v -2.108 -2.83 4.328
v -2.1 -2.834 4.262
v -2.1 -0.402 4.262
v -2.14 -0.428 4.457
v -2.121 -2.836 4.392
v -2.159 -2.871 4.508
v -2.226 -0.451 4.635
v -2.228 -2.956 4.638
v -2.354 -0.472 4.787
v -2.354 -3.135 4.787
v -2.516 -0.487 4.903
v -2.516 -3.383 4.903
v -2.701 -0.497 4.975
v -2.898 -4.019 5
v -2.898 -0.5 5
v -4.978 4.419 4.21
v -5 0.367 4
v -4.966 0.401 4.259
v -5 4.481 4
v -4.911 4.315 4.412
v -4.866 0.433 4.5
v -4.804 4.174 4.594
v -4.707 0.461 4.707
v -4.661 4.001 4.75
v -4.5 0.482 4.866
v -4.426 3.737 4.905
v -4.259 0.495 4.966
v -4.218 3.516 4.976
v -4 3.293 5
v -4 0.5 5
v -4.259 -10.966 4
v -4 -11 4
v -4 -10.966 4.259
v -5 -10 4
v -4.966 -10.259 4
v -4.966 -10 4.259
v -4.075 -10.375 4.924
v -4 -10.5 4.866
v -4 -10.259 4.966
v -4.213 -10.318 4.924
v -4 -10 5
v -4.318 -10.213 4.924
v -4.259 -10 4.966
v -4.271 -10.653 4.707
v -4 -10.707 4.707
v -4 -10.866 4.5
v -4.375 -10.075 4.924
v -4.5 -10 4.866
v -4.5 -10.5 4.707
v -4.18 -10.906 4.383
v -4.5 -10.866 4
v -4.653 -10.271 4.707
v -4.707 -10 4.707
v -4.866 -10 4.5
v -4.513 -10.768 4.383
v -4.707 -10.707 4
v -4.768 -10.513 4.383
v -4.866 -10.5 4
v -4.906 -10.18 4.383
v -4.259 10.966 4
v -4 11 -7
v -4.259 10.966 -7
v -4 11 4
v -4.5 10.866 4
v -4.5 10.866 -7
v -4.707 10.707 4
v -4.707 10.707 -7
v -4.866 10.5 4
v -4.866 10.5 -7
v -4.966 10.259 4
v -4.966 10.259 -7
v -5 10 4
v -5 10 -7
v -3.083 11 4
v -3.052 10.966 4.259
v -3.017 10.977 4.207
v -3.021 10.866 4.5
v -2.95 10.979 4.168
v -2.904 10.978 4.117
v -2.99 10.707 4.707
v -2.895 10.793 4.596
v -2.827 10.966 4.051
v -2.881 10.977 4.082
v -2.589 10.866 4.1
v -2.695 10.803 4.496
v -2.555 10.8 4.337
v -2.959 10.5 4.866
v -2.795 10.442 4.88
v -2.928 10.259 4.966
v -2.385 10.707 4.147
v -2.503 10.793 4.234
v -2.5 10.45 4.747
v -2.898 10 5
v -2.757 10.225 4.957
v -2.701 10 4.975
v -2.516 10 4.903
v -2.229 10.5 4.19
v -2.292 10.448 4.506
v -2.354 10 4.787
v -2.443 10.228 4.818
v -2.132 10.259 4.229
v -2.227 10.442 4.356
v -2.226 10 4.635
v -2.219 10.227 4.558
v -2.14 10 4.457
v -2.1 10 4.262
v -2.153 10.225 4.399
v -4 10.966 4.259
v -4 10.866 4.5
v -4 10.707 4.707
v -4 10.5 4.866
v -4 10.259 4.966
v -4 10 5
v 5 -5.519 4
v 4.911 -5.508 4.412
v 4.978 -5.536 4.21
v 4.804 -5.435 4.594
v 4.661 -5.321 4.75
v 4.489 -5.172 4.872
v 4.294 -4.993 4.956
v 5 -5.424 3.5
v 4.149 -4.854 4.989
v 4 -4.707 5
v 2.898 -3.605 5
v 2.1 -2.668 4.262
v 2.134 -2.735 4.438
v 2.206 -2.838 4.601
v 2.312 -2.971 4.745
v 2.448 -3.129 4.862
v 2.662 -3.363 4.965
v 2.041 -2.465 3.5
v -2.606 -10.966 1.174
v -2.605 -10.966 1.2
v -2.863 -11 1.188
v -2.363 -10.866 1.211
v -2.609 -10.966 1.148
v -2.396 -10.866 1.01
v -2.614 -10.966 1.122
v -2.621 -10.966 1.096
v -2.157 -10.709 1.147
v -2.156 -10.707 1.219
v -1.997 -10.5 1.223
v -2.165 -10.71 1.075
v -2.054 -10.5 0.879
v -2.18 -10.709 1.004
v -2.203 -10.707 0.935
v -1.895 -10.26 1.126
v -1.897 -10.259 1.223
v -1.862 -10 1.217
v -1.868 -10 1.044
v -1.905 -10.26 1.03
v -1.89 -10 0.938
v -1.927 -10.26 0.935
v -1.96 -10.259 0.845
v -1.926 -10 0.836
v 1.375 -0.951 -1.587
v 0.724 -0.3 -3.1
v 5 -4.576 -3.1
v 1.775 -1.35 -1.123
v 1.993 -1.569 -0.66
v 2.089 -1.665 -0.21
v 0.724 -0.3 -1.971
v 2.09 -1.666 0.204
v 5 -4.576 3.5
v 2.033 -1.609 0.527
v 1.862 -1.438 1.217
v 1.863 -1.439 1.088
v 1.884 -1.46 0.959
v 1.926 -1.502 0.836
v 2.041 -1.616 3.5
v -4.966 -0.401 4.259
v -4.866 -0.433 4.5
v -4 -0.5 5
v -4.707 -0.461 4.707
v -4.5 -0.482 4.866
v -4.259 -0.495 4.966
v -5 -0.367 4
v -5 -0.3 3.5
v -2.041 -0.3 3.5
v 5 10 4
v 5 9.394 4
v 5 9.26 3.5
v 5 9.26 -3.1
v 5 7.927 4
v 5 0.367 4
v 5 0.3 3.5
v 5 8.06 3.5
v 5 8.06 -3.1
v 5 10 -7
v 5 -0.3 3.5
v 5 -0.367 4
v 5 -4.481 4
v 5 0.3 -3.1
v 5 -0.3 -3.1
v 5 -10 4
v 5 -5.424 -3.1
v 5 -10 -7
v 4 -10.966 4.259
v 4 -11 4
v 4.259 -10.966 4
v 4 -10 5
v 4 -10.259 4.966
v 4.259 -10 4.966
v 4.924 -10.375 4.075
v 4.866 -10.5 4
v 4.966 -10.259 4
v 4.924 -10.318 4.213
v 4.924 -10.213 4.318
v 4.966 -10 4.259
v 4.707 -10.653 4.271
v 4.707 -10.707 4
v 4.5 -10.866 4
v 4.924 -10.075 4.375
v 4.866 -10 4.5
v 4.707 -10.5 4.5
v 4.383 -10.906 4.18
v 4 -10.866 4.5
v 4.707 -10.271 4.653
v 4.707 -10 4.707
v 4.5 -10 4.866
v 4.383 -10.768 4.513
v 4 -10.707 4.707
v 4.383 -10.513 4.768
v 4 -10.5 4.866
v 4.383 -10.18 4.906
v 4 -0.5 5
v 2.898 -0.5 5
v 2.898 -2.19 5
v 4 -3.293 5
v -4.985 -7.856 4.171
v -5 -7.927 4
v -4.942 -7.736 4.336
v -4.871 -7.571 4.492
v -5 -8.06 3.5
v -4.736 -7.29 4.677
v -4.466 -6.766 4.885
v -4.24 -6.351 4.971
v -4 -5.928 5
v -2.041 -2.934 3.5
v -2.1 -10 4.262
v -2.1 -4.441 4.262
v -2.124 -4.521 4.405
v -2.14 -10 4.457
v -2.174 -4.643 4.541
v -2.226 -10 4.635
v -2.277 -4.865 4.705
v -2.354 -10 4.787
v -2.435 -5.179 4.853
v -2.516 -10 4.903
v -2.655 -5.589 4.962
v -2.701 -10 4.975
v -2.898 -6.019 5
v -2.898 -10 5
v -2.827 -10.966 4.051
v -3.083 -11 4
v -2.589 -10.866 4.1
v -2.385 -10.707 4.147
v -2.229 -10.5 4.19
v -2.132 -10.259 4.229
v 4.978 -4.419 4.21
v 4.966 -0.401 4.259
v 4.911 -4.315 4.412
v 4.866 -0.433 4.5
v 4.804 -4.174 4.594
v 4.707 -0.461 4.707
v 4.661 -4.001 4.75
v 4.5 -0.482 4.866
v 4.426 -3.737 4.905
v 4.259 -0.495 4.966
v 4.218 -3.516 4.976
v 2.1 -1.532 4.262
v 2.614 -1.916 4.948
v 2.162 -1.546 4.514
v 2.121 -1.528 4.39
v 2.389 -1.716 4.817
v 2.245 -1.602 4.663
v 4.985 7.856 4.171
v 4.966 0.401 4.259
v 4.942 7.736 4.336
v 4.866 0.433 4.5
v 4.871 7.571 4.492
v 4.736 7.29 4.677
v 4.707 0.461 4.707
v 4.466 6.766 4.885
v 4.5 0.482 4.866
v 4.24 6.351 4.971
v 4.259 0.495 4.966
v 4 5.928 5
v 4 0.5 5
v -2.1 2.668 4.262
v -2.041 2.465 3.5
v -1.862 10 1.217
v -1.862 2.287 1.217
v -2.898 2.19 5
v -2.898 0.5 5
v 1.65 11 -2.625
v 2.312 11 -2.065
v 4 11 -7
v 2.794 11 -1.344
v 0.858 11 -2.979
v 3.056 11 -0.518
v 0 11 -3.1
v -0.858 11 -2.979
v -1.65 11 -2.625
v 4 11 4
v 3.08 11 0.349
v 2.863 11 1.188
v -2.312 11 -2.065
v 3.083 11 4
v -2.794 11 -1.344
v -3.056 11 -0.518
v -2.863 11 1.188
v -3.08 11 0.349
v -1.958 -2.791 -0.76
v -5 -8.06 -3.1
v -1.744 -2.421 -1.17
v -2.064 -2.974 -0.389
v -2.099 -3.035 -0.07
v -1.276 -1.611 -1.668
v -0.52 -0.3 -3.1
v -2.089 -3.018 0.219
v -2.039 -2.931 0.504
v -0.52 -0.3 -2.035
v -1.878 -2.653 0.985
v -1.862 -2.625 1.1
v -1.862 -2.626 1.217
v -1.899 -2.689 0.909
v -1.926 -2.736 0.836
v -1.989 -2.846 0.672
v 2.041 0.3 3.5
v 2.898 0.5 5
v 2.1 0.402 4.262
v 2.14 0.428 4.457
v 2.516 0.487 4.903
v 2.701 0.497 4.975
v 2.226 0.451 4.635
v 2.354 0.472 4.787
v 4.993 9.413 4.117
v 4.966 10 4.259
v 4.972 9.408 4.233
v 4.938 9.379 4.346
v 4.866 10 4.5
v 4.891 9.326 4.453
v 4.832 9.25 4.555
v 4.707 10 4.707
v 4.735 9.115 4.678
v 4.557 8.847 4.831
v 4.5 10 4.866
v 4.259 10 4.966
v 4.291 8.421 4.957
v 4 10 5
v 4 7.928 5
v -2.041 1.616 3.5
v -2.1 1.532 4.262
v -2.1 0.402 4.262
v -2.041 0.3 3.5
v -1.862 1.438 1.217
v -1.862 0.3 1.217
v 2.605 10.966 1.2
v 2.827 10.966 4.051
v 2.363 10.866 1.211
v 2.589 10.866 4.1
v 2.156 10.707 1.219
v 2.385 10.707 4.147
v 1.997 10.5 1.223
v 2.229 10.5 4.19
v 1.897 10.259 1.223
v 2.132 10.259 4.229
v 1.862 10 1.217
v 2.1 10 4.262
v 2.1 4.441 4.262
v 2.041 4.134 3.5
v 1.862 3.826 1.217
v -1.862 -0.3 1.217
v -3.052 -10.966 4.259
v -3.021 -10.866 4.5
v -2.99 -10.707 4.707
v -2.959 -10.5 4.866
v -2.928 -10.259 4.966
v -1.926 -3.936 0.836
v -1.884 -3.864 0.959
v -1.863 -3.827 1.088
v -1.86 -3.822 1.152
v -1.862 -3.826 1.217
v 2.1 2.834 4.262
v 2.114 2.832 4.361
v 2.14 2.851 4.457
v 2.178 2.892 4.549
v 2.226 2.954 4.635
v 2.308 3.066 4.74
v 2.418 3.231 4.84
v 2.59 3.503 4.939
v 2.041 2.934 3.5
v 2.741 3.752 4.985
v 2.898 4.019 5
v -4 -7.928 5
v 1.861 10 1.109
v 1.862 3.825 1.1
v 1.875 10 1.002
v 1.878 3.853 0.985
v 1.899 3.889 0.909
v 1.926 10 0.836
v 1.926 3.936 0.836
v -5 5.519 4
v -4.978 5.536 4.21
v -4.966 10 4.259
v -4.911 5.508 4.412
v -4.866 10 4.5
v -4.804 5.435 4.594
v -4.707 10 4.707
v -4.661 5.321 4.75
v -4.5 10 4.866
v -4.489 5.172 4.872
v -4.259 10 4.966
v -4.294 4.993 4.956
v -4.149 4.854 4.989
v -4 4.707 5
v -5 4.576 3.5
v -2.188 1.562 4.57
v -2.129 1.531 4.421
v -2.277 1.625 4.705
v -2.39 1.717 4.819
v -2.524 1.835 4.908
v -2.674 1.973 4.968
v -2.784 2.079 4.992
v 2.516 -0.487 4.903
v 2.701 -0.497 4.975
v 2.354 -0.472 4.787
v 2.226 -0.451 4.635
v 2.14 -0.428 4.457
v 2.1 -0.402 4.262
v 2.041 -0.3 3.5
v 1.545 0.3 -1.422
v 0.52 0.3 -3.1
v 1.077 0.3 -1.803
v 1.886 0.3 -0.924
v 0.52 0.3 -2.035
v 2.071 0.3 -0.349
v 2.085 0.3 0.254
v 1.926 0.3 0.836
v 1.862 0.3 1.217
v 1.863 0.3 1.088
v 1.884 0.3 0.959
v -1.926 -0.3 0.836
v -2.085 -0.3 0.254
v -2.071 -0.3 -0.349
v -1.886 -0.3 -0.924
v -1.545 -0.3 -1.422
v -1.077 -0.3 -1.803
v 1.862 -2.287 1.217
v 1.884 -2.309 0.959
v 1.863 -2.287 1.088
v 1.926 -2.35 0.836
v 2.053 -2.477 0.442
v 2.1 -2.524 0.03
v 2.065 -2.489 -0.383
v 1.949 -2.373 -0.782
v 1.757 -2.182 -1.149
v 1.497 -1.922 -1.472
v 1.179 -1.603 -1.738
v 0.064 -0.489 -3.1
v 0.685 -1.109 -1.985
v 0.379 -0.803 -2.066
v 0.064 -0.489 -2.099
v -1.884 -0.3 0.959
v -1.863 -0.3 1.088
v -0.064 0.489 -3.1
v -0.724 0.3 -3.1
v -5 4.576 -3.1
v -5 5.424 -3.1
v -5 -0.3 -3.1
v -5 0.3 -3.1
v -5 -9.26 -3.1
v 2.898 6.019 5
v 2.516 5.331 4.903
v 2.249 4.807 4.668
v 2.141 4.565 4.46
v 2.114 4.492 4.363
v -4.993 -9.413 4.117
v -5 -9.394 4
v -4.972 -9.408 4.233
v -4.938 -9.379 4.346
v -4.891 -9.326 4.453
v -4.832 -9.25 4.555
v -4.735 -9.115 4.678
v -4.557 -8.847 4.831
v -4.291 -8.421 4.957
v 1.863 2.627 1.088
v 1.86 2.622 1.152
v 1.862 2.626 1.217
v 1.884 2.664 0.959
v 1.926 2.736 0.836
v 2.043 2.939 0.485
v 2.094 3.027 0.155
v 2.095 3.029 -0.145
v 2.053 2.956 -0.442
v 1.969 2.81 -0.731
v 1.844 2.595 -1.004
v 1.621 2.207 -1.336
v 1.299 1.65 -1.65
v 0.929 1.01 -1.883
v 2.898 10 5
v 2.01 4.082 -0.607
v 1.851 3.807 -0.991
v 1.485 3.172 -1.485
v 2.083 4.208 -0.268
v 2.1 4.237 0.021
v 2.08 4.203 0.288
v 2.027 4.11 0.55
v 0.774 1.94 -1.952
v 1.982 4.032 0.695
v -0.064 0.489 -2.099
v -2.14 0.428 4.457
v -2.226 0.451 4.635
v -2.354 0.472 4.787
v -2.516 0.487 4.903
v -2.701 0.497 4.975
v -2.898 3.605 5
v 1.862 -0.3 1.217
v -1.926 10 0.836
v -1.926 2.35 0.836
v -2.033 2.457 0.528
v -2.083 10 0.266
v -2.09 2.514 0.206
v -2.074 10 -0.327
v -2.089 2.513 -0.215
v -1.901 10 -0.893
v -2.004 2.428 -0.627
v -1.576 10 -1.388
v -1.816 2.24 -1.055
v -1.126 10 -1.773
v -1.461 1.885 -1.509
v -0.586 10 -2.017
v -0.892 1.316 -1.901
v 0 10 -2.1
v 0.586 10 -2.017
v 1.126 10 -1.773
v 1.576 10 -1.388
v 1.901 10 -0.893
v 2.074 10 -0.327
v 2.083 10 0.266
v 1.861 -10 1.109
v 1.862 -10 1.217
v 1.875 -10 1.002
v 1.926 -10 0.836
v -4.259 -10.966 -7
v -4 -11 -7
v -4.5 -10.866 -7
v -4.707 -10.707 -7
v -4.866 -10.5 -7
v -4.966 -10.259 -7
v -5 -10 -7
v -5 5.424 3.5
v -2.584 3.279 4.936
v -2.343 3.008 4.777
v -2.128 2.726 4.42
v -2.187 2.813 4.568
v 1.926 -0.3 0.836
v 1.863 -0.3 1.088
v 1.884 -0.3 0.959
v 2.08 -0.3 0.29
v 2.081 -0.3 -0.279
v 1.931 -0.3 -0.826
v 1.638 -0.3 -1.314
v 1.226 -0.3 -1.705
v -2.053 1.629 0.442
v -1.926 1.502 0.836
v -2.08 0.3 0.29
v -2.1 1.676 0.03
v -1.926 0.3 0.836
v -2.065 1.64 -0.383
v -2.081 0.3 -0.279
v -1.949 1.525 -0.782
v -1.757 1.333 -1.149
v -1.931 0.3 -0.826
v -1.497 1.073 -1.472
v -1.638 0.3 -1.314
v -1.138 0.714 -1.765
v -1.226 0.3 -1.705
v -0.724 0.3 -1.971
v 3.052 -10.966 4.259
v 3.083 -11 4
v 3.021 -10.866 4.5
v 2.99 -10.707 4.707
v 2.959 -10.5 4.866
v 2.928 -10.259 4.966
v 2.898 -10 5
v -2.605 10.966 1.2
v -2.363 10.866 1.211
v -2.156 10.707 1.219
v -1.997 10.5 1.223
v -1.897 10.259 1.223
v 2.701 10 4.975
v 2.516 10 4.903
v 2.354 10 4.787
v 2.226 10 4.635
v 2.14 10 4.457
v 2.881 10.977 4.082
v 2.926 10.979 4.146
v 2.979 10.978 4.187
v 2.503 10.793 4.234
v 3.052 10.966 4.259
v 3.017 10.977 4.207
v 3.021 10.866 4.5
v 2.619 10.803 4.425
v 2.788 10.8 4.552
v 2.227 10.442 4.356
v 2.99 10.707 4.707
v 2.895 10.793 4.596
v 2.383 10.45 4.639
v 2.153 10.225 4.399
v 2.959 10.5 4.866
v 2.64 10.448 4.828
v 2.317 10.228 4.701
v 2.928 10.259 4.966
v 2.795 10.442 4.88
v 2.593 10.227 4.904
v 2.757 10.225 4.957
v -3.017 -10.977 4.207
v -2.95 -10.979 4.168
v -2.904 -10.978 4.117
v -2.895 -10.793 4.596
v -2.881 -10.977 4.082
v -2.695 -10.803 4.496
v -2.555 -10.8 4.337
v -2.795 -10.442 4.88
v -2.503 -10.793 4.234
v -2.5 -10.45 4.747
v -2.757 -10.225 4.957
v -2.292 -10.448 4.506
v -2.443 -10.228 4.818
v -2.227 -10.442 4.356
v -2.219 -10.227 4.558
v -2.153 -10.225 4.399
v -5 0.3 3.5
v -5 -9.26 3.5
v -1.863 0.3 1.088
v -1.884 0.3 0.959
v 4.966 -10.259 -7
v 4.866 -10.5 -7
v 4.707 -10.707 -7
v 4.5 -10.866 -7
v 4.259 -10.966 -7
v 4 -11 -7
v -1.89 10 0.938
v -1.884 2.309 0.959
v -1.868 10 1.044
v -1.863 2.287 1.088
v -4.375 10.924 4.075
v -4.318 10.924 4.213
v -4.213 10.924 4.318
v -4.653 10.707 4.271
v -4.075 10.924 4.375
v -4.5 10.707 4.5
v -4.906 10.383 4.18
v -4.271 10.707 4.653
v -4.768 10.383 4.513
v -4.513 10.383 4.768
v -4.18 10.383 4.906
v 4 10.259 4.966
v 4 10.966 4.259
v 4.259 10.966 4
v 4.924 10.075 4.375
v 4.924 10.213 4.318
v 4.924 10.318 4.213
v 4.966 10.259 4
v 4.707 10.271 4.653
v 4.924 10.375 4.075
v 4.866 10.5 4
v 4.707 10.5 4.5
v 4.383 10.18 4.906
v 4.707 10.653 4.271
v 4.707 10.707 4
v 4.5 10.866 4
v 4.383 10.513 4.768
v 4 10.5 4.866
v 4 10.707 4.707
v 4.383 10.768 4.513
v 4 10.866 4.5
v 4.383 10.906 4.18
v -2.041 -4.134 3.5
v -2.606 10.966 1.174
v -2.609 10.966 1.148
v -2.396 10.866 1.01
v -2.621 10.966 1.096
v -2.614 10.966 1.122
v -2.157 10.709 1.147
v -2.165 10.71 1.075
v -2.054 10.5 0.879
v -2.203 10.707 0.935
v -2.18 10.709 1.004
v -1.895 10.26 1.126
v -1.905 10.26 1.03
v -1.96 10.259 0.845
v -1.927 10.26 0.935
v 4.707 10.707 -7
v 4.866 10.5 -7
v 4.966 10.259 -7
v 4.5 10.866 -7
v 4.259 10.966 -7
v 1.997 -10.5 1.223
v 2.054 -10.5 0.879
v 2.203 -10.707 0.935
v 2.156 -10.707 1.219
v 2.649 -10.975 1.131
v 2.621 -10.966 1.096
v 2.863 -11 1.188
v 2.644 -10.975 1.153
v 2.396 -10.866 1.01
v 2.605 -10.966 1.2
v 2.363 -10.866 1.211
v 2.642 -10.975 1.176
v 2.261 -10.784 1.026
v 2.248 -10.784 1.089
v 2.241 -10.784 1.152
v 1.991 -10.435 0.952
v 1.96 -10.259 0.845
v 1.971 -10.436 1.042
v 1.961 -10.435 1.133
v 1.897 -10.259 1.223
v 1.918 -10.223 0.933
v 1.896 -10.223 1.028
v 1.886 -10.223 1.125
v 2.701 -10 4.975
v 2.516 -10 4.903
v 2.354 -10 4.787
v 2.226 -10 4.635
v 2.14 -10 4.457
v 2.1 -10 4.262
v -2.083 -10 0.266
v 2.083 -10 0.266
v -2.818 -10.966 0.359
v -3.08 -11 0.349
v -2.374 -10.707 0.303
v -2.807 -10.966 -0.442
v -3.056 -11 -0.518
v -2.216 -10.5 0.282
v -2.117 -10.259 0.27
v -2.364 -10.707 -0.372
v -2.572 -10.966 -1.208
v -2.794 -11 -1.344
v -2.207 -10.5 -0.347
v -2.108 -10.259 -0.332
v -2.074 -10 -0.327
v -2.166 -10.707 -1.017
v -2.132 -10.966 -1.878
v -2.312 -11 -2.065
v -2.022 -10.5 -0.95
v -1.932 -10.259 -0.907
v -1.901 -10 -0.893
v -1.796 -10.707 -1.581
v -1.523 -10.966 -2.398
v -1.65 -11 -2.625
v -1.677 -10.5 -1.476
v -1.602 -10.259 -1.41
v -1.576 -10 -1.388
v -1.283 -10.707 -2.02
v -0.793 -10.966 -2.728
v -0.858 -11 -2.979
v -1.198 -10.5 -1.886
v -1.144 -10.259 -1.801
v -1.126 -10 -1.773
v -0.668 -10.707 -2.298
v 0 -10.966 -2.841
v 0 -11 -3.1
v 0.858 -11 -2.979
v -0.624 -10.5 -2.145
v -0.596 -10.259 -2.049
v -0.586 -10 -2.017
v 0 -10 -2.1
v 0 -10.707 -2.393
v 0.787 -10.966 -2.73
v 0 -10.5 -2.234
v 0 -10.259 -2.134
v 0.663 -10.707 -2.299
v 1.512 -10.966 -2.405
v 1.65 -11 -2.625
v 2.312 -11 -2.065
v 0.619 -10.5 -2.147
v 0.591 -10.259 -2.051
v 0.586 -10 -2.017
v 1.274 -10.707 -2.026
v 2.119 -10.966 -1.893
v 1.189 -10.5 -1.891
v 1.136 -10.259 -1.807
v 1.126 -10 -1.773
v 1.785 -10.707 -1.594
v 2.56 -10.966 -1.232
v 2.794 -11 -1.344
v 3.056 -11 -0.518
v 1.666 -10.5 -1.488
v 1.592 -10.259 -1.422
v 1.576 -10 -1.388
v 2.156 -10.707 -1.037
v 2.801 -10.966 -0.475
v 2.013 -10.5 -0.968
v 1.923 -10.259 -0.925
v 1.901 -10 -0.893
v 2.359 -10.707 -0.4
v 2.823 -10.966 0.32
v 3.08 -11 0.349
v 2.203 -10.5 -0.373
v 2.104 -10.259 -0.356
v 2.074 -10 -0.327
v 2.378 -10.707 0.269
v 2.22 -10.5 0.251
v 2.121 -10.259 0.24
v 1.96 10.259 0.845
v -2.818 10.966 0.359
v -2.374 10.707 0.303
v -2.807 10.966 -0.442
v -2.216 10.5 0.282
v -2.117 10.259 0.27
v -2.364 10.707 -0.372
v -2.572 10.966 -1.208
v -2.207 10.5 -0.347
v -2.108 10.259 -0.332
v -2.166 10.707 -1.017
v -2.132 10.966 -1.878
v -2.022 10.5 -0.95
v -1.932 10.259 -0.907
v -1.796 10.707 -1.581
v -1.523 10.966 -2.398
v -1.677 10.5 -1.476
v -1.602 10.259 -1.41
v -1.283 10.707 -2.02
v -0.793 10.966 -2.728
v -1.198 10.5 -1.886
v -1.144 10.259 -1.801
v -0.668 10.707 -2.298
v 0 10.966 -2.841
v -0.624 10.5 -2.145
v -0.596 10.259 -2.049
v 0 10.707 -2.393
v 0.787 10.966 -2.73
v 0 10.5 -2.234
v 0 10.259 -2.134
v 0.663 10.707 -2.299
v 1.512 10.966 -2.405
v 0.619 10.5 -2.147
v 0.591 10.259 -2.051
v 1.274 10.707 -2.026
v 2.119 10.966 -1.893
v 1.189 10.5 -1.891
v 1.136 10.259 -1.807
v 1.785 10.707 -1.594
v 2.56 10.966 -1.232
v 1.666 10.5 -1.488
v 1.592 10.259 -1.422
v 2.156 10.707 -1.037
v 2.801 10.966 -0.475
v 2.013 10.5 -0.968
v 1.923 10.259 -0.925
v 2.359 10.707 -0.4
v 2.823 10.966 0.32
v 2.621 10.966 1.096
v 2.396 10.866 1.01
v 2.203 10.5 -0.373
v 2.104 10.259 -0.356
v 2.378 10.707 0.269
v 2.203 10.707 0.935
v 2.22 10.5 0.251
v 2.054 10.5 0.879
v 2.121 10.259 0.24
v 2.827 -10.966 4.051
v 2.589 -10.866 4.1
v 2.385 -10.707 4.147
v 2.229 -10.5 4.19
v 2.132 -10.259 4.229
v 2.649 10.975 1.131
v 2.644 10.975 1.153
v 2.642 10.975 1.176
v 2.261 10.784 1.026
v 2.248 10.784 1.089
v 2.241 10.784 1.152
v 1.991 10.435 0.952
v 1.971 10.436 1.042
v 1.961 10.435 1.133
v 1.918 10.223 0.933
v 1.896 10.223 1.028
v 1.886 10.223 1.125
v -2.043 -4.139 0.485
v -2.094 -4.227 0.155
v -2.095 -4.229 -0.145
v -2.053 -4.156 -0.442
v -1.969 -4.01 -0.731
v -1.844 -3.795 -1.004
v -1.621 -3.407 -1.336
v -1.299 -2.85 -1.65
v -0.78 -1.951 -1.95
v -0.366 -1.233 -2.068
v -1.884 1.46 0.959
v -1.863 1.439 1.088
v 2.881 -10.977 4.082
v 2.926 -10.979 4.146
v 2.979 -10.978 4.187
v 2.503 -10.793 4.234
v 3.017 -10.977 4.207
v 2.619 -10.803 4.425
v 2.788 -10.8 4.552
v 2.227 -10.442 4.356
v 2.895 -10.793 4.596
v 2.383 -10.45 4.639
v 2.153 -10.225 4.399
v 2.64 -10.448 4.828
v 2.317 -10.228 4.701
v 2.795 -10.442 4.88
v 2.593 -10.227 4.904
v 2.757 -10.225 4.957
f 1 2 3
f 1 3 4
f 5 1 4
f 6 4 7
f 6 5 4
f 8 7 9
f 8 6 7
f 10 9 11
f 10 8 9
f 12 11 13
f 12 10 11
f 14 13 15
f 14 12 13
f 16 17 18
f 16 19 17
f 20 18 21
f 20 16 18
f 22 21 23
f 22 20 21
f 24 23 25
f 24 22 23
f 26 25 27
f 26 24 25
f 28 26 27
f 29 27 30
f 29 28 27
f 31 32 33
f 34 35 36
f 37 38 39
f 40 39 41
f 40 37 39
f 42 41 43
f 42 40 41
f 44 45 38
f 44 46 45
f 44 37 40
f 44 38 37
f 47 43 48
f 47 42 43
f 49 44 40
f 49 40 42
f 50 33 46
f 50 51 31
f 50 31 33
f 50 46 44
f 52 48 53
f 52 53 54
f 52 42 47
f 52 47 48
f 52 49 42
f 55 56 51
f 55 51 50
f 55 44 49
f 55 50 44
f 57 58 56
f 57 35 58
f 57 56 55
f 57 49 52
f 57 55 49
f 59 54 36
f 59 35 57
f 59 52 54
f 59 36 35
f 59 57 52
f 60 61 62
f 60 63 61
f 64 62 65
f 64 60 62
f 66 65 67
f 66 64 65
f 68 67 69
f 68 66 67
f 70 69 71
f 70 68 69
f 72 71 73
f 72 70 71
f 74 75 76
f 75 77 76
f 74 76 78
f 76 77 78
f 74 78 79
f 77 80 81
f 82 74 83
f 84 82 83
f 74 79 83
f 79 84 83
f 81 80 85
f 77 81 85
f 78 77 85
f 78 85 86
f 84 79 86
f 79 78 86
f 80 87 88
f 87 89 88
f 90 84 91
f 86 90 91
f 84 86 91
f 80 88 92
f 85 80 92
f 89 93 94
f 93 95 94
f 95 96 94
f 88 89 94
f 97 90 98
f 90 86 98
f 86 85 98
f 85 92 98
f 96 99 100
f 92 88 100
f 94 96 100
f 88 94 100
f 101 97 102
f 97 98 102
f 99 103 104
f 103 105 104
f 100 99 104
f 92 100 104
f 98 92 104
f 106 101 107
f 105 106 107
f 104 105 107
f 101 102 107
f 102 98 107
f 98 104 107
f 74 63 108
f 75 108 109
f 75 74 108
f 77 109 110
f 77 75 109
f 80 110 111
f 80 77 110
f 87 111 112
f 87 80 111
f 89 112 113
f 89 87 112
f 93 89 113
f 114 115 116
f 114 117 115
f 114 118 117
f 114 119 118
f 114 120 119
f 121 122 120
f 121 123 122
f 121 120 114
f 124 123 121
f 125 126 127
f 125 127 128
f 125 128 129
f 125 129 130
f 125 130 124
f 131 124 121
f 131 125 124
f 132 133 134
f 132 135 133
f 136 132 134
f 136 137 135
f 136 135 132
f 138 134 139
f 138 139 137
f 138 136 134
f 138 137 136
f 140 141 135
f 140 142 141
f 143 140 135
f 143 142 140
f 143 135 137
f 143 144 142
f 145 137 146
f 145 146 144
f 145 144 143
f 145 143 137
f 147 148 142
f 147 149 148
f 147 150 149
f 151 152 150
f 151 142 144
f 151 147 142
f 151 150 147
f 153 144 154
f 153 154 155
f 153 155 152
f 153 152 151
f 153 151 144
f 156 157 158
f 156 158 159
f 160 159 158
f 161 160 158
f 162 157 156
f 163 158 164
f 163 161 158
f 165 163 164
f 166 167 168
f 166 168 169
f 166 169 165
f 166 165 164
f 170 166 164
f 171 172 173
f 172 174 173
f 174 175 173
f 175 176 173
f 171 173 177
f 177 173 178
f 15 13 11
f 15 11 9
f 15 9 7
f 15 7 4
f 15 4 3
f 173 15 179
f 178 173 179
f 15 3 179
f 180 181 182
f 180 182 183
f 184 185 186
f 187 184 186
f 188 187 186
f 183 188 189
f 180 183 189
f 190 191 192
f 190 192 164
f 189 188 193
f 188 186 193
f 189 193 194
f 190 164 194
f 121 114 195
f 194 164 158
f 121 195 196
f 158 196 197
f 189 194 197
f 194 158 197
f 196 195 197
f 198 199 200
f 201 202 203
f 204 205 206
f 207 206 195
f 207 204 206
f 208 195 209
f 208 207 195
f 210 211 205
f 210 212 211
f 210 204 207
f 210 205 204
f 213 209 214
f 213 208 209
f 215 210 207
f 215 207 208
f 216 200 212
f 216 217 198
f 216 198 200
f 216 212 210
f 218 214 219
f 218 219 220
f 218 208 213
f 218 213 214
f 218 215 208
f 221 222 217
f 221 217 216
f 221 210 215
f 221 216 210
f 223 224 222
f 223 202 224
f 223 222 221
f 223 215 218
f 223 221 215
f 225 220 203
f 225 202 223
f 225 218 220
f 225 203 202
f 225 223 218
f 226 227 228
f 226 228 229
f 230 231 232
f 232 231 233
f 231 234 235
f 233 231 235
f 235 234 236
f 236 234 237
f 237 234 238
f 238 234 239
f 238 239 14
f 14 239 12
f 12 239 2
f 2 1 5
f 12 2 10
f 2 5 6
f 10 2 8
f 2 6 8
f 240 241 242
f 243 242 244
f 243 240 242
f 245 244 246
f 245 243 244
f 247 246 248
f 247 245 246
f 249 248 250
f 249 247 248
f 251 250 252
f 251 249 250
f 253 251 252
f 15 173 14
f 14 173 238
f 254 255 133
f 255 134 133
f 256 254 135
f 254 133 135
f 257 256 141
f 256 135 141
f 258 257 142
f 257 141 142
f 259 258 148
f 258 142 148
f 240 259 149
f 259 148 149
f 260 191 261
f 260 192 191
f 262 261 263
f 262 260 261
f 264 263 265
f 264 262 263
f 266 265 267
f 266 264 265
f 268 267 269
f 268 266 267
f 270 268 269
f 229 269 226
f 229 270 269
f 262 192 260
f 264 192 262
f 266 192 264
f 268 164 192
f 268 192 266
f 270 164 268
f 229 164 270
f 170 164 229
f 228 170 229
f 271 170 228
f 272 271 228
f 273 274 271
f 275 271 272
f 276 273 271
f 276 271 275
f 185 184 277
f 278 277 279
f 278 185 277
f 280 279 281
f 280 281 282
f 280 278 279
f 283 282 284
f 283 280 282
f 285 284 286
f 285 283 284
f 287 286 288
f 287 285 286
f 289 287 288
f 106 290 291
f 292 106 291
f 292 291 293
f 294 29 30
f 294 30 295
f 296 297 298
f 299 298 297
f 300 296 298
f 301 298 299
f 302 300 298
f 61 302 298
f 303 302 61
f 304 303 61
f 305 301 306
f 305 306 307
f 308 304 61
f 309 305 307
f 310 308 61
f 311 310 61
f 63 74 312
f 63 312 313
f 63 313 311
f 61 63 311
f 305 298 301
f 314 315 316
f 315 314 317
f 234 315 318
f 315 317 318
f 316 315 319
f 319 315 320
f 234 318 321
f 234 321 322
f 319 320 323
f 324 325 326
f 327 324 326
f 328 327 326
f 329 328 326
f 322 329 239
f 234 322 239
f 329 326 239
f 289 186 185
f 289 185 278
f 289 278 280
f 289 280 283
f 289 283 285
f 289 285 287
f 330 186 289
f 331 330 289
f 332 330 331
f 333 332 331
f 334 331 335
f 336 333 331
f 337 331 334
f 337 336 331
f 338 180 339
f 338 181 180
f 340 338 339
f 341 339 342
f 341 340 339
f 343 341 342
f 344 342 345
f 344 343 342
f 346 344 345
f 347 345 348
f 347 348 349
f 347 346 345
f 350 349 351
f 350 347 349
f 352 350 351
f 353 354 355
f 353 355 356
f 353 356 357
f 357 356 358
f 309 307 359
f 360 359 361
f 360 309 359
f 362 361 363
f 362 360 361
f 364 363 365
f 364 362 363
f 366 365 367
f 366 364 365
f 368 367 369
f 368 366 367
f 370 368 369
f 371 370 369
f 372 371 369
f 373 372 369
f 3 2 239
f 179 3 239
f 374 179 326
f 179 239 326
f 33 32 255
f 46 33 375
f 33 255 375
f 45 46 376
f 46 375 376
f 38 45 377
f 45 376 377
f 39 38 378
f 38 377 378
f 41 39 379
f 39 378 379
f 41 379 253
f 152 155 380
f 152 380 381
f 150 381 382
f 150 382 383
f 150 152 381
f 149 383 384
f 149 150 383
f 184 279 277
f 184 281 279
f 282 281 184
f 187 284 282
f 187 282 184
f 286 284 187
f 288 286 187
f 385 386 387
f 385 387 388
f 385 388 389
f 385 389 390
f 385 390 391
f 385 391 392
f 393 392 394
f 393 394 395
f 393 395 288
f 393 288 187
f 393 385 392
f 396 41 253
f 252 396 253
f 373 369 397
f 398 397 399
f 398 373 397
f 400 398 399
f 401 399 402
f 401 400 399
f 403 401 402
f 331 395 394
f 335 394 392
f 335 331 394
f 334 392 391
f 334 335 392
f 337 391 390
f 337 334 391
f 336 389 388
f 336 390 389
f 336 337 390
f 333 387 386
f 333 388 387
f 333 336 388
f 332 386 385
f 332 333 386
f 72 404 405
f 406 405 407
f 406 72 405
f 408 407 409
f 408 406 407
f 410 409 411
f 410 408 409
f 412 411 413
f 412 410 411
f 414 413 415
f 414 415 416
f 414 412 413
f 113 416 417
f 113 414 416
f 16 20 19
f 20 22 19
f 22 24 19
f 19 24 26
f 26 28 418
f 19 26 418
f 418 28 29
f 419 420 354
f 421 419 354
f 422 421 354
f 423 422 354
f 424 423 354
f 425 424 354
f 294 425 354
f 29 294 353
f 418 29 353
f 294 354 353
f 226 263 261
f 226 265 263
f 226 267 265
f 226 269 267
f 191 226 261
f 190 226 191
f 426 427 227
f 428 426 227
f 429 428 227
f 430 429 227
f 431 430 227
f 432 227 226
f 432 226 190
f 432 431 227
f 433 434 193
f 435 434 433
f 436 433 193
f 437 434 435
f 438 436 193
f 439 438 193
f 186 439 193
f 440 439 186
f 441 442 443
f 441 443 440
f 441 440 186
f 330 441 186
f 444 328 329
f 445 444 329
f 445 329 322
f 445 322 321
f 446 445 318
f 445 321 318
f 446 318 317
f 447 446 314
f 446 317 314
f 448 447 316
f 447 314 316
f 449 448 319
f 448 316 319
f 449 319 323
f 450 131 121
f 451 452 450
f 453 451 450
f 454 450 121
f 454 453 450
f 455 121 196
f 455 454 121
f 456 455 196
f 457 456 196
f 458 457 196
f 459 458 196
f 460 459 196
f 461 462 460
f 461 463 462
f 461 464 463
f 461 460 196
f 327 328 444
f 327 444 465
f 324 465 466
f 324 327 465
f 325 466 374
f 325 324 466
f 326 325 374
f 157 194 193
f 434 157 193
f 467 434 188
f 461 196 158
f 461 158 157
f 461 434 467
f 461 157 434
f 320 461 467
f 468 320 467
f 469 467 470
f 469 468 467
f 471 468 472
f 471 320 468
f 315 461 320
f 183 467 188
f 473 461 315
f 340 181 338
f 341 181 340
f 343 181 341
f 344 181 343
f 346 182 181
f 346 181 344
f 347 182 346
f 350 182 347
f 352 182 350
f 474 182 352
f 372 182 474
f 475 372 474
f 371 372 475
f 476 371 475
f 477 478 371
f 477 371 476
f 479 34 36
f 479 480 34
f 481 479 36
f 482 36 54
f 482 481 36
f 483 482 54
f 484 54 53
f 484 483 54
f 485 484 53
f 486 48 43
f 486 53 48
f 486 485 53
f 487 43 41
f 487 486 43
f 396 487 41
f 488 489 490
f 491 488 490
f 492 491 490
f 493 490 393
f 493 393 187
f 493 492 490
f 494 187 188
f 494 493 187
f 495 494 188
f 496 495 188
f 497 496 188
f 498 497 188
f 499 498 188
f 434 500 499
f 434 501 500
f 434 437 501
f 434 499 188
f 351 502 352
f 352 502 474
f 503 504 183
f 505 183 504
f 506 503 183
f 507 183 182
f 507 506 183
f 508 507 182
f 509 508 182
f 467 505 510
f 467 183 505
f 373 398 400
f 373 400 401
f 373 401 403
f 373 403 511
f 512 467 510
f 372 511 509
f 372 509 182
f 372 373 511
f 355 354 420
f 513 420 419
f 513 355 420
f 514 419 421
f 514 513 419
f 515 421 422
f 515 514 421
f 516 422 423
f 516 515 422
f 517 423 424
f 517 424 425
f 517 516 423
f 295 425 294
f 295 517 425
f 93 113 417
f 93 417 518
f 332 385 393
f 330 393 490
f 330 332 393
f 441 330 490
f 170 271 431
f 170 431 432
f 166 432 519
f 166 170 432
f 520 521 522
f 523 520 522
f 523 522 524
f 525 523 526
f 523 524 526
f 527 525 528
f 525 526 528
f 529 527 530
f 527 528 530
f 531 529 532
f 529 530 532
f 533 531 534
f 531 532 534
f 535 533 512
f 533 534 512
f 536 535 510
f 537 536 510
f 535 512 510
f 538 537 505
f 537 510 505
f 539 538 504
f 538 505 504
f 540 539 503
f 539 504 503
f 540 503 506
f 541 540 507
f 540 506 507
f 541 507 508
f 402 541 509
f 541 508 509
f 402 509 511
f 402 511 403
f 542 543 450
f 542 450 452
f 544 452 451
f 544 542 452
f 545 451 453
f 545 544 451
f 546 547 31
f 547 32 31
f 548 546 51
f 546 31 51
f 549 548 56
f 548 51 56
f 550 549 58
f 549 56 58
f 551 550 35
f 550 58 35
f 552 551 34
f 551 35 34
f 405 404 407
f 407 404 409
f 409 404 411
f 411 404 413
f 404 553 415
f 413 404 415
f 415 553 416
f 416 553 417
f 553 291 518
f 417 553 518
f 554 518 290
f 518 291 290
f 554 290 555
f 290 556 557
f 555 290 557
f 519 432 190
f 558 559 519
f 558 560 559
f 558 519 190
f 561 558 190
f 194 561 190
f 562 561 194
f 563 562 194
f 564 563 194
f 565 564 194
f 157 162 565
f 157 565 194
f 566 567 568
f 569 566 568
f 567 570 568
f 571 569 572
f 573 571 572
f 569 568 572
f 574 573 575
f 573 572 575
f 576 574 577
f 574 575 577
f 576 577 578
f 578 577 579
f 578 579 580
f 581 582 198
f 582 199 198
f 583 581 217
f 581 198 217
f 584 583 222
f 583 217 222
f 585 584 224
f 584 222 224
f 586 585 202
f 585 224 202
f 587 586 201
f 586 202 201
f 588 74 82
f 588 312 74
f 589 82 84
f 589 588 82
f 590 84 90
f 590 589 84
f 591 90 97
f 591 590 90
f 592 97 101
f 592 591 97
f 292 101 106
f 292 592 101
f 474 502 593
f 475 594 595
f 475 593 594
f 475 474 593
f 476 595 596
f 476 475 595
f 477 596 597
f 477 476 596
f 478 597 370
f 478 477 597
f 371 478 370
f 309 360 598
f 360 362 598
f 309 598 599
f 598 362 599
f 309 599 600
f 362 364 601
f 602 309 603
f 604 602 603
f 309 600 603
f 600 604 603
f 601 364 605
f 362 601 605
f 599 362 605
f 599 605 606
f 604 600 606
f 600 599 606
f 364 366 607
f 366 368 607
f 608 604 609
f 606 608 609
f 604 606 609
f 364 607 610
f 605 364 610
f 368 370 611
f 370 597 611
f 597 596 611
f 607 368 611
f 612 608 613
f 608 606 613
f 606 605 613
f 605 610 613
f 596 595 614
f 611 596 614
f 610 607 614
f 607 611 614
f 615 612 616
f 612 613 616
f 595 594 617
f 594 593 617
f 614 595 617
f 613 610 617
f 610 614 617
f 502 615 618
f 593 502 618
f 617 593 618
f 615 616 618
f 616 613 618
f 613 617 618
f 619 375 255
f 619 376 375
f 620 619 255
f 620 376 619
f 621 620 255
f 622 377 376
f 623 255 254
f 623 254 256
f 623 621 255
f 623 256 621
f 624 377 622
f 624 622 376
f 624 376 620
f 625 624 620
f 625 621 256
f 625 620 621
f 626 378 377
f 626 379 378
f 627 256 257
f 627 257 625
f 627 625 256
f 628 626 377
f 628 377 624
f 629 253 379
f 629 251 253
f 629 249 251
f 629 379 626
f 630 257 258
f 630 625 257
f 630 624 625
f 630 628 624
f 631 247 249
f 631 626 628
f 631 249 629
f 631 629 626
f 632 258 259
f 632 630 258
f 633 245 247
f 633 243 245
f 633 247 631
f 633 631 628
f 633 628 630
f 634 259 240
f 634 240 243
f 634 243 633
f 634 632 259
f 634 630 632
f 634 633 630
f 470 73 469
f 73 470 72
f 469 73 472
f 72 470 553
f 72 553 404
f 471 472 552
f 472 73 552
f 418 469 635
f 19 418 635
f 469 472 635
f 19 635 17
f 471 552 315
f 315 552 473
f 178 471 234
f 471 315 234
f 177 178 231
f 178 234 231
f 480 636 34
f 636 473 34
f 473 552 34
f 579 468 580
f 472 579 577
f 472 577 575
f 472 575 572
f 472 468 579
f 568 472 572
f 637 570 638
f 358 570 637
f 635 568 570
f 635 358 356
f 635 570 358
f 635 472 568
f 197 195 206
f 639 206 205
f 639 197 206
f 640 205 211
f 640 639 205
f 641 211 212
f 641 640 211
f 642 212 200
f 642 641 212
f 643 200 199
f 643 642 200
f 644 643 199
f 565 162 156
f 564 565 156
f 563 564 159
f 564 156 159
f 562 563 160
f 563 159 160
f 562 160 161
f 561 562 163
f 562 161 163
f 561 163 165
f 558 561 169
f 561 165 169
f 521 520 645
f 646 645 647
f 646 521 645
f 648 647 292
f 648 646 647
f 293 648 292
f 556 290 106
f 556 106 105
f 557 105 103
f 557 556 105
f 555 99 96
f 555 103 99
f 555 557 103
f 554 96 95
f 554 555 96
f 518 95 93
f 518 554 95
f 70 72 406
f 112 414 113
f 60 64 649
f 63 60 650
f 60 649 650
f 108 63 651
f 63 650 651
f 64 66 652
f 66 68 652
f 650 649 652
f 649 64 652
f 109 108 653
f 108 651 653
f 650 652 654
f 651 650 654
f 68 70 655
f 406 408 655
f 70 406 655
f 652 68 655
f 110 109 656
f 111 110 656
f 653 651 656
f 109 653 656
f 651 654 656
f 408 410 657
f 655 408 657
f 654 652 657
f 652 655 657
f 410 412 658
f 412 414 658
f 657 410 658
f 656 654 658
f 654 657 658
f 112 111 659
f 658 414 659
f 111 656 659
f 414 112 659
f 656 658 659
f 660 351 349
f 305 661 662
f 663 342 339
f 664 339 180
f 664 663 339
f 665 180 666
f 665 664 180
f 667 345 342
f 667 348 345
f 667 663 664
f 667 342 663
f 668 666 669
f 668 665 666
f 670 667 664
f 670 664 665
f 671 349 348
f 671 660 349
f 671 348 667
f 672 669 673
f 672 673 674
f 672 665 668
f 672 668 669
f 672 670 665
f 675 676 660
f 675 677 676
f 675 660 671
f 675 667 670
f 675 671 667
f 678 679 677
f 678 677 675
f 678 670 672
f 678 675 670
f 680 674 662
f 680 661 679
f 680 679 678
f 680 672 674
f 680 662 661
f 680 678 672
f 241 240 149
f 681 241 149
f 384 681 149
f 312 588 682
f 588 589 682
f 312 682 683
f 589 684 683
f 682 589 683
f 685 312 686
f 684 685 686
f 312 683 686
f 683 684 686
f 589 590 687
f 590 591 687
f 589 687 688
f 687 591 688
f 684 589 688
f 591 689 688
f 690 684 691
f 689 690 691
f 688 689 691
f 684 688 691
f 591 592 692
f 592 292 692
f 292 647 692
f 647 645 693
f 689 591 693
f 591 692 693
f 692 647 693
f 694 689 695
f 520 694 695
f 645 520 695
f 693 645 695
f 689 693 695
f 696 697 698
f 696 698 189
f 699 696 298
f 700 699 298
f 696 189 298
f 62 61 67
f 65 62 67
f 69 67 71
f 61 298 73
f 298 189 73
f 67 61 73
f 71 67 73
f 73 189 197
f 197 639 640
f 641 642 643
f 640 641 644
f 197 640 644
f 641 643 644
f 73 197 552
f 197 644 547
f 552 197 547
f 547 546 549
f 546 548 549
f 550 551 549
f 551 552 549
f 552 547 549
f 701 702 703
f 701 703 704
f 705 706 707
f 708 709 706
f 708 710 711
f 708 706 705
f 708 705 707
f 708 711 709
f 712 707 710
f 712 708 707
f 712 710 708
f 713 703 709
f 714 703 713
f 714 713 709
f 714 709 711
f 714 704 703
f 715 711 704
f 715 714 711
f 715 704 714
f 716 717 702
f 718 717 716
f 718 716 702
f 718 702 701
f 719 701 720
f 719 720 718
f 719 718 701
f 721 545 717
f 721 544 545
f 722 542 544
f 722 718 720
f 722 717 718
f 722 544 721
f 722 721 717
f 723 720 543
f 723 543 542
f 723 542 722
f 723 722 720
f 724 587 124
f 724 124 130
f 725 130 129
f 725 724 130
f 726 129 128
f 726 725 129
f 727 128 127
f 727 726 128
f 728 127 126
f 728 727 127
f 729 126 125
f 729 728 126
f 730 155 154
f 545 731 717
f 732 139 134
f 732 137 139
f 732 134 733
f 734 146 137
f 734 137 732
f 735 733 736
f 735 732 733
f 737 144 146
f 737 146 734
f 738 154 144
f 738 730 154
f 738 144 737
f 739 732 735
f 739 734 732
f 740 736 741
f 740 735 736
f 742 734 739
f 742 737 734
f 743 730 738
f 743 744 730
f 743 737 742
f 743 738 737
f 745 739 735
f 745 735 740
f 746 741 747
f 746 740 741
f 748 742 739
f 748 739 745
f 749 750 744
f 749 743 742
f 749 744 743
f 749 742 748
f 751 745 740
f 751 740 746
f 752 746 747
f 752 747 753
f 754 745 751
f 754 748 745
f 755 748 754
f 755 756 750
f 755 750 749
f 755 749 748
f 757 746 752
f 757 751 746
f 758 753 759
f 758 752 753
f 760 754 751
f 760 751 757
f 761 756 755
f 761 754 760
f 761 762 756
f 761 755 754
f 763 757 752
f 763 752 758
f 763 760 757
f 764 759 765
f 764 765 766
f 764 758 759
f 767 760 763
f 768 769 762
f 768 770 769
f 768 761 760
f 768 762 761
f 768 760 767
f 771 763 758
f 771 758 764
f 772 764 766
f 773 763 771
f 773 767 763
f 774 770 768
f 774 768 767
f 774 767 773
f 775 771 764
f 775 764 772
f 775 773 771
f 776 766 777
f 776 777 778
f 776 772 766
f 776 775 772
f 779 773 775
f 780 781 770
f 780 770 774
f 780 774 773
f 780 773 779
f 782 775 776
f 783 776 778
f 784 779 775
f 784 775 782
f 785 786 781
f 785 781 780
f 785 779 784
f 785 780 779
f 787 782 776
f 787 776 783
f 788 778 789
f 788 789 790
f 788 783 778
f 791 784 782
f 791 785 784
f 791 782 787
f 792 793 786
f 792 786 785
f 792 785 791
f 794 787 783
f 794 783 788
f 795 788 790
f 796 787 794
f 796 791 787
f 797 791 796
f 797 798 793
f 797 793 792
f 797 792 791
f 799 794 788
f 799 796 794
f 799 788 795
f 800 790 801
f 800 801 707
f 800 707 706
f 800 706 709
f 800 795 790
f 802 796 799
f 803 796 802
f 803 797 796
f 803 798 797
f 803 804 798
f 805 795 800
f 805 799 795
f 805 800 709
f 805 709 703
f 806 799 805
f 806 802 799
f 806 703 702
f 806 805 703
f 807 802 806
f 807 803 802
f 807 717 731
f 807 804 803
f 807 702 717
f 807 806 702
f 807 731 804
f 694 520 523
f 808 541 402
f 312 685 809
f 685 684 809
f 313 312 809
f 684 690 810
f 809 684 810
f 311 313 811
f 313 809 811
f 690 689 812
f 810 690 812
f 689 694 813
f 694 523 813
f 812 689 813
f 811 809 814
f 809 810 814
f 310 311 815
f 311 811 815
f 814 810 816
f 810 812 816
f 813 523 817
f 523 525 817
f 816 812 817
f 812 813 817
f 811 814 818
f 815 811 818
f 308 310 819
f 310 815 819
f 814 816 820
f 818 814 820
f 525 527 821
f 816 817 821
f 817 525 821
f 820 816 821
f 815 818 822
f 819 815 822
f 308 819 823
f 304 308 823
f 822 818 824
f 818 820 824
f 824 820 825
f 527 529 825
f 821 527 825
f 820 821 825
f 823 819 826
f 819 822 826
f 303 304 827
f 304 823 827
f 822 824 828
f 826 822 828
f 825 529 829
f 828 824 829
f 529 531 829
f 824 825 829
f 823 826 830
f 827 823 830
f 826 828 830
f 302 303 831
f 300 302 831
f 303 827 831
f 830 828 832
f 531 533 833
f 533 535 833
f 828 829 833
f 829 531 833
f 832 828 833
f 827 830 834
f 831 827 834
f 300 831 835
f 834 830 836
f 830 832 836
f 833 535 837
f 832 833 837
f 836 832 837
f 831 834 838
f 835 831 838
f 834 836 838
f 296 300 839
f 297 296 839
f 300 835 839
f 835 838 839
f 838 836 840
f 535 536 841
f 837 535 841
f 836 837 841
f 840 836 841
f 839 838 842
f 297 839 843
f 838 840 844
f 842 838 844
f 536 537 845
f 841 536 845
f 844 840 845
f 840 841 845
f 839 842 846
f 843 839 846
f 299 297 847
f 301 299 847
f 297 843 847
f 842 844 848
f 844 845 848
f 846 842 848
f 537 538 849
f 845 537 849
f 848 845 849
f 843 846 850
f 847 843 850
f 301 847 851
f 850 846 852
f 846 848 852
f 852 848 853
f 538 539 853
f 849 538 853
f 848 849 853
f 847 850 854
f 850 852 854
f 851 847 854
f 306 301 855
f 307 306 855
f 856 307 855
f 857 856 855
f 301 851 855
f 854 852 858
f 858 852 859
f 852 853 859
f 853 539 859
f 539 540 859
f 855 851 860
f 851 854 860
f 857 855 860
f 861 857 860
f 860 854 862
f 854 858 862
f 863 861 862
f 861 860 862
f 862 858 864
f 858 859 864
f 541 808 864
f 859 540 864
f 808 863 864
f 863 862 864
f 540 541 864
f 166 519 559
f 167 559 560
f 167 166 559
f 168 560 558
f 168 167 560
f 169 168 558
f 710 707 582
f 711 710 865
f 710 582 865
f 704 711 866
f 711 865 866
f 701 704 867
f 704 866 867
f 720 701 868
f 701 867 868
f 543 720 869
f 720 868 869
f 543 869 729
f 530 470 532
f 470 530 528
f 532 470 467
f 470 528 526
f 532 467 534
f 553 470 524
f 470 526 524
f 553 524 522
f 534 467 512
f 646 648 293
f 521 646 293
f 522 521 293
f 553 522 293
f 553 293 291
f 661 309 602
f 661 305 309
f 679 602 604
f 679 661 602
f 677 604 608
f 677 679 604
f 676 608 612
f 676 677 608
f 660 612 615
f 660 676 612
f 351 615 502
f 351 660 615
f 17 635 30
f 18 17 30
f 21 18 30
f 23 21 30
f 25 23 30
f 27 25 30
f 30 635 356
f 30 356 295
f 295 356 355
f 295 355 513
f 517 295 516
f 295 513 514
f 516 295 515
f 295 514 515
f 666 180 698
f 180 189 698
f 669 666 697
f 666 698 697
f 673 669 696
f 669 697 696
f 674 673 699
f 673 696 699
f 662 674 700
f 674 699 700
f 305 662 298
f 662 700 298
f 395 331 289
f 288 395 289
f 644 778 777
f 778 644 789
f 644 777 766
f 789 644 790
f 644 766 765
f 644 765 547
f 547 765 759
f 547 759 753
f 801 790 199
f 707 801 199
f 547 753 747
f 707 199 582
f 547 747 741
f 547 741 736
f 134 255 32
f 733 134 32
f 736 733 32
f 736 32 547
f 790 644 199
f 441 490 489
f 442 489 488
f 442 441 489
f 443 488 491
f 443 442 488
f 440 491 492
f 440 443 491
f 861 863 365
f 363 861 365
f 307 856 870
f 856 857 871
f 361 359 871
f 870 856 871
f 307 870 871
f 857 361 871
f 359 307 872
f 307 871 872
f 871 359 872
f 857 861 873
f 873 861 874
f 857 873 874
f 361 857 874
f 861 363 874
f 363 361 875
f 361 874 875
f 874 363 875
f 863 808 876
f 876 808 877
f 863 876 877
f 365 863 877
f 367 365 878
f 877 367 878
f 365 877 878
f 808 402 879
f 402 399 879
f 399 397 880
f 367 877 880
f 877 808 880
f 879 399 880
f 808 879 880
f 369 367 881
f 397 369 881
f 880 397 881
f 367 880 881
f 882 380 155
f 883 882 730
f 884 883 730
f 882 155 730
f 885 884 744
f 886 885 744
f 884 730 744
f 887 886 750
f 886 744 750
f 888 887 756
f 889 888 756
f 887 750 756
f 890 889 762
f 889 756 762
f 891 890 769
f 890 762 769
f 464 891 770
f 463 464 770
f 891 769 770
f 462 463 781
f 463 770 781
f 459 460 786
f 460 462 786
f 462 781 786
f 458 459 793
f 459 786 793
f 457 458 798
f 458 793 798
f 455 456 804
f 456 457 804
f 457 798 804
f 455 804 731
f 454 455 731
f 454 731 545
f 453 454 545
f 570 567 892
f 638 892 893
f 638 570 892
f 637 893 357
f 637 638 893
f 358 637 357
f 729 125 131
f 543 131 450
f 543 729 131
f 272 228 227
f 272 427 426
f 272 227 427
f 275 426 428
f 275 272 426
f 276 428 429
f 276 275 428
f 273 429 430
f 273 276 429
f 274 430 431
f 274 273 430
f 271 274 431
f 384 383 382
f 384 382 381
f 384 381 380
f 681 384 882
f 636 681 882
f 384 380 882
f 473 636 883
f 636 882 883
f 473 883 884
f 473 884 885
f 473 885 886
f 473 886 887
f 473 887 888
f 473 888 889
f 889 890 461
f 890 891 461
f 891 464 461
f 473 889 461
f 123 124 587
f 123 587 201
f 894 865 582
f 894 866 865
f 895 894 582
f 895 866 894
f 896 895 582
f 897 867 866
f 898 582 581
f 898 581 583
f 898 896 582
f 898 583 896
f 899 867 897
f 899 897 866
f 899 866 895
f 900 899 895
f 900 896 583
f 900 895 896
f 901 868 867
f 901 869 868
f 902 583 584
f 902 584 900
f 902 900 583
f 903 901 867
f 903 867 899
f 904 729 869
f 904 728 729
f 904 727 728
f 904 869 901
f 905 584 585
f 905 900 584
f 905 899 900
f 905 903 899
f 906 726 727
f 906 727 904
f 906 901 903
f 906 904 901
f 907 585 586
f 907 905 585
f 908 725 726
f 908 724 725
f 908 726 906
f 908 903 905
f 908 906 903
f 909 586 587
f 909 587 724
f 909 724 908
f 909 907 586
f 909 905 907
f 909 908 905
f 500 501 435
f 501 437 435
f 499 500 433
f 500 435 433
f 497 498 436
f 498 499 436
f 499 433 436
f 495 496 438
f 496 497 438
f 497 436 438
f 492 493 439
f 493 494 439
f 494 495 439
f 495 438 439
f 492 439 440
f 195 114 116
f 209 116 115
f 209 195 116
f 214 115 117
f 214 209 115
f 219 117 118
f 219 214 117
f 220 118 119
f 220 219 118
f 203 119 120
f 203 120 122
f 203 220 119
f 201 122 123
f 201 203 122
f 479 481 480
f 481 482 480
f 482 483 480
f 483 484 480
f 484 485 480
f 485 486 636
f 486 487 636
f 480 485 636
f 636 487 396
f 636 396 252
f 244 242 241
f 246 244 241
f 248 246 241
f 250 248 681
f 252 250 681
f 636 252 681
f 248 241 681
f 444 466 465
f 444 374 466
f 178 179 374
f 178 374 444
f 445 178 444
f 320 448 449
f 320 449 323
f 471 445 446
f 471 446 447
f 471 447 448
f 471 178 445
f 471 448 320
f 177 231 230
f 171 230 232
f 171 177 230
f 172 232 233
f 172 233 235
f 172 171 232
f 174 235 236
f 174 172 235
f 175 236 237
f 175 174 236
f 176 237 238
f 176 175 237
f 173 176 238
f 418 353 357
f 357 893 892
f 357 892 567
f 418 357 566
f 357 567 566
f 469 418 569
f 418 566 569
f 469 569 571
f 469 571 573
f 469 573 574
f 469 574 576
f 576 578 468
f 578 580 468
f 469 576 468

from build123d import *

# Parameters (mm, degrees)
PAD_DEPTH            = 11
POCKET_DEPTH         = 5.001
POCKET_DEPTH_BACK    = 5.001
POCKET001_DEPTH      = 11.314708
POCKET001_DEPTH_BACK = 11.314708
POCKET002_DEPTH      = 12.027279
POCKET002_DEPTH_BACK = 12.027279
FILLET_R             = 1


with BuildPart() as part:
    # Sketch → Pad (new body, symmetric)
    with BuildSketch(Plane.XZ):
        with BuildLine():
            Line((5, 5), (5, -7))
            Line((5, -7), (-5, -7))
            Line((-5, -7), (-5, 5))
            Line((-5, 5), (-2.897576, 5))
            ThreePointArc((-2.1, 4.262231), (-2.354338, 4.787276), (-2.897576, 5))
            Line((-2.1, 4.262231), (-1.862424, 1.217394))
            ThreePointArc((-1.926207, 0.836497), (-1.870986, 1.023039), (-1.862424, 1.217394))
            ThreePointArc((-1.926207, 0.836497), (0, -2.1), (1.926207, 0.836497))
            ThreePointArc((1.862424, 1.217394), (1.870986, 1.023039), (1.926207, 0.836497))
            Line((2.1, 4.262231), (1.862424, 1.217394))
            ThreePointArc((2.897576, 5), (2.354338, 4.787276), (2.1, 4.262231))
            Line((2.897576, 5), (5, 5))
        make_face()
    extrude(amount=PAD_DEPTH, both=True)

    # Sketch001 → Pocket (cut, two sides)
    with BuildSketch(Plane.YZ) as pocket_sk:
        Polygon((-0.3, -3.1), (0.3, -3.1), (0.3, 3.5), (0.5, 5), (-0.5, 5), (-0.3, 3.5), align=None)
    extrude(amount=-POCKET_DEPTH, mode=Mode.SUBTRACT)
    extrude(pocket_sk.sketch, amount=POCKET_DEPTH_BACK, mode=Mode.SUBTRACT)

    # Sketch002 → Pocket001 (cut, two sides)
    with BuildSketch(Plane(origin=(0, 0, 0), x_dir=(0.707107, 0.707107, 0), z_dir=(0.707107, -0.707107, 0))) as pocket001_sk:
        Polygon((-0.3, -3.1), (0.3, -3.1), (0.3, 3.5), (0.5, 5), (-0.5, 5), (-0.3, 3.5), align=None)
    extrude(amount=-POCKET001_DEPTH, mode=Mode.SUBTRACT)
    extrude(pocket001_sk.sketch, amount=POCKET001_DEPTH_BACK, mode=Mode.SUBTRACT)

    # Sketch003 → Pocket002 (cut, two sides)
    with BuildSketch(Plane(origin=(0, 0, 0), x_dir=(-0.866025, 0.5, 0), z_dir=(0.5, 0.866025, 0))) as pocket002_sk:
        Polygon((-0.3, -3.1), (0.3, -3.1), (0.3, 3.5), (0.5, 5), (-0.5, 5), (-0.3, 3.5), align=None)
    extrude(amount=-POCKET002_DEPTH, mode=Mode.SUBTRACT)
    extrude(pocket002_sk.sketch, amount=POCKET002_DEPTH_BACK, mode=Mode.SUBTRACT)

    # Fillet
    fillet_edges = [part.edges().sort_by_distance(p)[0] for p in [
        (-5, -11, -1),
        (-3.948788, -11, 5),
        (-5, -10.330127, 5),
        (-5, -4.080127, 5),
        (-5, 2.396447, 5),
        (-5, 8.353553, 5),
        (-5, 11, -1),
        (-3.948788, 11, 5),
        (5, 10.330127, 5),
        (5, 4.080127, 5),
        (5, 11, -1),
        (5, -11, -1),
        (5, -8.353553, 5),
        (5, -2.396447, 5),
    ]]
    fillet(fillet_edges, radius=FILLET_R)


solid = part.part
